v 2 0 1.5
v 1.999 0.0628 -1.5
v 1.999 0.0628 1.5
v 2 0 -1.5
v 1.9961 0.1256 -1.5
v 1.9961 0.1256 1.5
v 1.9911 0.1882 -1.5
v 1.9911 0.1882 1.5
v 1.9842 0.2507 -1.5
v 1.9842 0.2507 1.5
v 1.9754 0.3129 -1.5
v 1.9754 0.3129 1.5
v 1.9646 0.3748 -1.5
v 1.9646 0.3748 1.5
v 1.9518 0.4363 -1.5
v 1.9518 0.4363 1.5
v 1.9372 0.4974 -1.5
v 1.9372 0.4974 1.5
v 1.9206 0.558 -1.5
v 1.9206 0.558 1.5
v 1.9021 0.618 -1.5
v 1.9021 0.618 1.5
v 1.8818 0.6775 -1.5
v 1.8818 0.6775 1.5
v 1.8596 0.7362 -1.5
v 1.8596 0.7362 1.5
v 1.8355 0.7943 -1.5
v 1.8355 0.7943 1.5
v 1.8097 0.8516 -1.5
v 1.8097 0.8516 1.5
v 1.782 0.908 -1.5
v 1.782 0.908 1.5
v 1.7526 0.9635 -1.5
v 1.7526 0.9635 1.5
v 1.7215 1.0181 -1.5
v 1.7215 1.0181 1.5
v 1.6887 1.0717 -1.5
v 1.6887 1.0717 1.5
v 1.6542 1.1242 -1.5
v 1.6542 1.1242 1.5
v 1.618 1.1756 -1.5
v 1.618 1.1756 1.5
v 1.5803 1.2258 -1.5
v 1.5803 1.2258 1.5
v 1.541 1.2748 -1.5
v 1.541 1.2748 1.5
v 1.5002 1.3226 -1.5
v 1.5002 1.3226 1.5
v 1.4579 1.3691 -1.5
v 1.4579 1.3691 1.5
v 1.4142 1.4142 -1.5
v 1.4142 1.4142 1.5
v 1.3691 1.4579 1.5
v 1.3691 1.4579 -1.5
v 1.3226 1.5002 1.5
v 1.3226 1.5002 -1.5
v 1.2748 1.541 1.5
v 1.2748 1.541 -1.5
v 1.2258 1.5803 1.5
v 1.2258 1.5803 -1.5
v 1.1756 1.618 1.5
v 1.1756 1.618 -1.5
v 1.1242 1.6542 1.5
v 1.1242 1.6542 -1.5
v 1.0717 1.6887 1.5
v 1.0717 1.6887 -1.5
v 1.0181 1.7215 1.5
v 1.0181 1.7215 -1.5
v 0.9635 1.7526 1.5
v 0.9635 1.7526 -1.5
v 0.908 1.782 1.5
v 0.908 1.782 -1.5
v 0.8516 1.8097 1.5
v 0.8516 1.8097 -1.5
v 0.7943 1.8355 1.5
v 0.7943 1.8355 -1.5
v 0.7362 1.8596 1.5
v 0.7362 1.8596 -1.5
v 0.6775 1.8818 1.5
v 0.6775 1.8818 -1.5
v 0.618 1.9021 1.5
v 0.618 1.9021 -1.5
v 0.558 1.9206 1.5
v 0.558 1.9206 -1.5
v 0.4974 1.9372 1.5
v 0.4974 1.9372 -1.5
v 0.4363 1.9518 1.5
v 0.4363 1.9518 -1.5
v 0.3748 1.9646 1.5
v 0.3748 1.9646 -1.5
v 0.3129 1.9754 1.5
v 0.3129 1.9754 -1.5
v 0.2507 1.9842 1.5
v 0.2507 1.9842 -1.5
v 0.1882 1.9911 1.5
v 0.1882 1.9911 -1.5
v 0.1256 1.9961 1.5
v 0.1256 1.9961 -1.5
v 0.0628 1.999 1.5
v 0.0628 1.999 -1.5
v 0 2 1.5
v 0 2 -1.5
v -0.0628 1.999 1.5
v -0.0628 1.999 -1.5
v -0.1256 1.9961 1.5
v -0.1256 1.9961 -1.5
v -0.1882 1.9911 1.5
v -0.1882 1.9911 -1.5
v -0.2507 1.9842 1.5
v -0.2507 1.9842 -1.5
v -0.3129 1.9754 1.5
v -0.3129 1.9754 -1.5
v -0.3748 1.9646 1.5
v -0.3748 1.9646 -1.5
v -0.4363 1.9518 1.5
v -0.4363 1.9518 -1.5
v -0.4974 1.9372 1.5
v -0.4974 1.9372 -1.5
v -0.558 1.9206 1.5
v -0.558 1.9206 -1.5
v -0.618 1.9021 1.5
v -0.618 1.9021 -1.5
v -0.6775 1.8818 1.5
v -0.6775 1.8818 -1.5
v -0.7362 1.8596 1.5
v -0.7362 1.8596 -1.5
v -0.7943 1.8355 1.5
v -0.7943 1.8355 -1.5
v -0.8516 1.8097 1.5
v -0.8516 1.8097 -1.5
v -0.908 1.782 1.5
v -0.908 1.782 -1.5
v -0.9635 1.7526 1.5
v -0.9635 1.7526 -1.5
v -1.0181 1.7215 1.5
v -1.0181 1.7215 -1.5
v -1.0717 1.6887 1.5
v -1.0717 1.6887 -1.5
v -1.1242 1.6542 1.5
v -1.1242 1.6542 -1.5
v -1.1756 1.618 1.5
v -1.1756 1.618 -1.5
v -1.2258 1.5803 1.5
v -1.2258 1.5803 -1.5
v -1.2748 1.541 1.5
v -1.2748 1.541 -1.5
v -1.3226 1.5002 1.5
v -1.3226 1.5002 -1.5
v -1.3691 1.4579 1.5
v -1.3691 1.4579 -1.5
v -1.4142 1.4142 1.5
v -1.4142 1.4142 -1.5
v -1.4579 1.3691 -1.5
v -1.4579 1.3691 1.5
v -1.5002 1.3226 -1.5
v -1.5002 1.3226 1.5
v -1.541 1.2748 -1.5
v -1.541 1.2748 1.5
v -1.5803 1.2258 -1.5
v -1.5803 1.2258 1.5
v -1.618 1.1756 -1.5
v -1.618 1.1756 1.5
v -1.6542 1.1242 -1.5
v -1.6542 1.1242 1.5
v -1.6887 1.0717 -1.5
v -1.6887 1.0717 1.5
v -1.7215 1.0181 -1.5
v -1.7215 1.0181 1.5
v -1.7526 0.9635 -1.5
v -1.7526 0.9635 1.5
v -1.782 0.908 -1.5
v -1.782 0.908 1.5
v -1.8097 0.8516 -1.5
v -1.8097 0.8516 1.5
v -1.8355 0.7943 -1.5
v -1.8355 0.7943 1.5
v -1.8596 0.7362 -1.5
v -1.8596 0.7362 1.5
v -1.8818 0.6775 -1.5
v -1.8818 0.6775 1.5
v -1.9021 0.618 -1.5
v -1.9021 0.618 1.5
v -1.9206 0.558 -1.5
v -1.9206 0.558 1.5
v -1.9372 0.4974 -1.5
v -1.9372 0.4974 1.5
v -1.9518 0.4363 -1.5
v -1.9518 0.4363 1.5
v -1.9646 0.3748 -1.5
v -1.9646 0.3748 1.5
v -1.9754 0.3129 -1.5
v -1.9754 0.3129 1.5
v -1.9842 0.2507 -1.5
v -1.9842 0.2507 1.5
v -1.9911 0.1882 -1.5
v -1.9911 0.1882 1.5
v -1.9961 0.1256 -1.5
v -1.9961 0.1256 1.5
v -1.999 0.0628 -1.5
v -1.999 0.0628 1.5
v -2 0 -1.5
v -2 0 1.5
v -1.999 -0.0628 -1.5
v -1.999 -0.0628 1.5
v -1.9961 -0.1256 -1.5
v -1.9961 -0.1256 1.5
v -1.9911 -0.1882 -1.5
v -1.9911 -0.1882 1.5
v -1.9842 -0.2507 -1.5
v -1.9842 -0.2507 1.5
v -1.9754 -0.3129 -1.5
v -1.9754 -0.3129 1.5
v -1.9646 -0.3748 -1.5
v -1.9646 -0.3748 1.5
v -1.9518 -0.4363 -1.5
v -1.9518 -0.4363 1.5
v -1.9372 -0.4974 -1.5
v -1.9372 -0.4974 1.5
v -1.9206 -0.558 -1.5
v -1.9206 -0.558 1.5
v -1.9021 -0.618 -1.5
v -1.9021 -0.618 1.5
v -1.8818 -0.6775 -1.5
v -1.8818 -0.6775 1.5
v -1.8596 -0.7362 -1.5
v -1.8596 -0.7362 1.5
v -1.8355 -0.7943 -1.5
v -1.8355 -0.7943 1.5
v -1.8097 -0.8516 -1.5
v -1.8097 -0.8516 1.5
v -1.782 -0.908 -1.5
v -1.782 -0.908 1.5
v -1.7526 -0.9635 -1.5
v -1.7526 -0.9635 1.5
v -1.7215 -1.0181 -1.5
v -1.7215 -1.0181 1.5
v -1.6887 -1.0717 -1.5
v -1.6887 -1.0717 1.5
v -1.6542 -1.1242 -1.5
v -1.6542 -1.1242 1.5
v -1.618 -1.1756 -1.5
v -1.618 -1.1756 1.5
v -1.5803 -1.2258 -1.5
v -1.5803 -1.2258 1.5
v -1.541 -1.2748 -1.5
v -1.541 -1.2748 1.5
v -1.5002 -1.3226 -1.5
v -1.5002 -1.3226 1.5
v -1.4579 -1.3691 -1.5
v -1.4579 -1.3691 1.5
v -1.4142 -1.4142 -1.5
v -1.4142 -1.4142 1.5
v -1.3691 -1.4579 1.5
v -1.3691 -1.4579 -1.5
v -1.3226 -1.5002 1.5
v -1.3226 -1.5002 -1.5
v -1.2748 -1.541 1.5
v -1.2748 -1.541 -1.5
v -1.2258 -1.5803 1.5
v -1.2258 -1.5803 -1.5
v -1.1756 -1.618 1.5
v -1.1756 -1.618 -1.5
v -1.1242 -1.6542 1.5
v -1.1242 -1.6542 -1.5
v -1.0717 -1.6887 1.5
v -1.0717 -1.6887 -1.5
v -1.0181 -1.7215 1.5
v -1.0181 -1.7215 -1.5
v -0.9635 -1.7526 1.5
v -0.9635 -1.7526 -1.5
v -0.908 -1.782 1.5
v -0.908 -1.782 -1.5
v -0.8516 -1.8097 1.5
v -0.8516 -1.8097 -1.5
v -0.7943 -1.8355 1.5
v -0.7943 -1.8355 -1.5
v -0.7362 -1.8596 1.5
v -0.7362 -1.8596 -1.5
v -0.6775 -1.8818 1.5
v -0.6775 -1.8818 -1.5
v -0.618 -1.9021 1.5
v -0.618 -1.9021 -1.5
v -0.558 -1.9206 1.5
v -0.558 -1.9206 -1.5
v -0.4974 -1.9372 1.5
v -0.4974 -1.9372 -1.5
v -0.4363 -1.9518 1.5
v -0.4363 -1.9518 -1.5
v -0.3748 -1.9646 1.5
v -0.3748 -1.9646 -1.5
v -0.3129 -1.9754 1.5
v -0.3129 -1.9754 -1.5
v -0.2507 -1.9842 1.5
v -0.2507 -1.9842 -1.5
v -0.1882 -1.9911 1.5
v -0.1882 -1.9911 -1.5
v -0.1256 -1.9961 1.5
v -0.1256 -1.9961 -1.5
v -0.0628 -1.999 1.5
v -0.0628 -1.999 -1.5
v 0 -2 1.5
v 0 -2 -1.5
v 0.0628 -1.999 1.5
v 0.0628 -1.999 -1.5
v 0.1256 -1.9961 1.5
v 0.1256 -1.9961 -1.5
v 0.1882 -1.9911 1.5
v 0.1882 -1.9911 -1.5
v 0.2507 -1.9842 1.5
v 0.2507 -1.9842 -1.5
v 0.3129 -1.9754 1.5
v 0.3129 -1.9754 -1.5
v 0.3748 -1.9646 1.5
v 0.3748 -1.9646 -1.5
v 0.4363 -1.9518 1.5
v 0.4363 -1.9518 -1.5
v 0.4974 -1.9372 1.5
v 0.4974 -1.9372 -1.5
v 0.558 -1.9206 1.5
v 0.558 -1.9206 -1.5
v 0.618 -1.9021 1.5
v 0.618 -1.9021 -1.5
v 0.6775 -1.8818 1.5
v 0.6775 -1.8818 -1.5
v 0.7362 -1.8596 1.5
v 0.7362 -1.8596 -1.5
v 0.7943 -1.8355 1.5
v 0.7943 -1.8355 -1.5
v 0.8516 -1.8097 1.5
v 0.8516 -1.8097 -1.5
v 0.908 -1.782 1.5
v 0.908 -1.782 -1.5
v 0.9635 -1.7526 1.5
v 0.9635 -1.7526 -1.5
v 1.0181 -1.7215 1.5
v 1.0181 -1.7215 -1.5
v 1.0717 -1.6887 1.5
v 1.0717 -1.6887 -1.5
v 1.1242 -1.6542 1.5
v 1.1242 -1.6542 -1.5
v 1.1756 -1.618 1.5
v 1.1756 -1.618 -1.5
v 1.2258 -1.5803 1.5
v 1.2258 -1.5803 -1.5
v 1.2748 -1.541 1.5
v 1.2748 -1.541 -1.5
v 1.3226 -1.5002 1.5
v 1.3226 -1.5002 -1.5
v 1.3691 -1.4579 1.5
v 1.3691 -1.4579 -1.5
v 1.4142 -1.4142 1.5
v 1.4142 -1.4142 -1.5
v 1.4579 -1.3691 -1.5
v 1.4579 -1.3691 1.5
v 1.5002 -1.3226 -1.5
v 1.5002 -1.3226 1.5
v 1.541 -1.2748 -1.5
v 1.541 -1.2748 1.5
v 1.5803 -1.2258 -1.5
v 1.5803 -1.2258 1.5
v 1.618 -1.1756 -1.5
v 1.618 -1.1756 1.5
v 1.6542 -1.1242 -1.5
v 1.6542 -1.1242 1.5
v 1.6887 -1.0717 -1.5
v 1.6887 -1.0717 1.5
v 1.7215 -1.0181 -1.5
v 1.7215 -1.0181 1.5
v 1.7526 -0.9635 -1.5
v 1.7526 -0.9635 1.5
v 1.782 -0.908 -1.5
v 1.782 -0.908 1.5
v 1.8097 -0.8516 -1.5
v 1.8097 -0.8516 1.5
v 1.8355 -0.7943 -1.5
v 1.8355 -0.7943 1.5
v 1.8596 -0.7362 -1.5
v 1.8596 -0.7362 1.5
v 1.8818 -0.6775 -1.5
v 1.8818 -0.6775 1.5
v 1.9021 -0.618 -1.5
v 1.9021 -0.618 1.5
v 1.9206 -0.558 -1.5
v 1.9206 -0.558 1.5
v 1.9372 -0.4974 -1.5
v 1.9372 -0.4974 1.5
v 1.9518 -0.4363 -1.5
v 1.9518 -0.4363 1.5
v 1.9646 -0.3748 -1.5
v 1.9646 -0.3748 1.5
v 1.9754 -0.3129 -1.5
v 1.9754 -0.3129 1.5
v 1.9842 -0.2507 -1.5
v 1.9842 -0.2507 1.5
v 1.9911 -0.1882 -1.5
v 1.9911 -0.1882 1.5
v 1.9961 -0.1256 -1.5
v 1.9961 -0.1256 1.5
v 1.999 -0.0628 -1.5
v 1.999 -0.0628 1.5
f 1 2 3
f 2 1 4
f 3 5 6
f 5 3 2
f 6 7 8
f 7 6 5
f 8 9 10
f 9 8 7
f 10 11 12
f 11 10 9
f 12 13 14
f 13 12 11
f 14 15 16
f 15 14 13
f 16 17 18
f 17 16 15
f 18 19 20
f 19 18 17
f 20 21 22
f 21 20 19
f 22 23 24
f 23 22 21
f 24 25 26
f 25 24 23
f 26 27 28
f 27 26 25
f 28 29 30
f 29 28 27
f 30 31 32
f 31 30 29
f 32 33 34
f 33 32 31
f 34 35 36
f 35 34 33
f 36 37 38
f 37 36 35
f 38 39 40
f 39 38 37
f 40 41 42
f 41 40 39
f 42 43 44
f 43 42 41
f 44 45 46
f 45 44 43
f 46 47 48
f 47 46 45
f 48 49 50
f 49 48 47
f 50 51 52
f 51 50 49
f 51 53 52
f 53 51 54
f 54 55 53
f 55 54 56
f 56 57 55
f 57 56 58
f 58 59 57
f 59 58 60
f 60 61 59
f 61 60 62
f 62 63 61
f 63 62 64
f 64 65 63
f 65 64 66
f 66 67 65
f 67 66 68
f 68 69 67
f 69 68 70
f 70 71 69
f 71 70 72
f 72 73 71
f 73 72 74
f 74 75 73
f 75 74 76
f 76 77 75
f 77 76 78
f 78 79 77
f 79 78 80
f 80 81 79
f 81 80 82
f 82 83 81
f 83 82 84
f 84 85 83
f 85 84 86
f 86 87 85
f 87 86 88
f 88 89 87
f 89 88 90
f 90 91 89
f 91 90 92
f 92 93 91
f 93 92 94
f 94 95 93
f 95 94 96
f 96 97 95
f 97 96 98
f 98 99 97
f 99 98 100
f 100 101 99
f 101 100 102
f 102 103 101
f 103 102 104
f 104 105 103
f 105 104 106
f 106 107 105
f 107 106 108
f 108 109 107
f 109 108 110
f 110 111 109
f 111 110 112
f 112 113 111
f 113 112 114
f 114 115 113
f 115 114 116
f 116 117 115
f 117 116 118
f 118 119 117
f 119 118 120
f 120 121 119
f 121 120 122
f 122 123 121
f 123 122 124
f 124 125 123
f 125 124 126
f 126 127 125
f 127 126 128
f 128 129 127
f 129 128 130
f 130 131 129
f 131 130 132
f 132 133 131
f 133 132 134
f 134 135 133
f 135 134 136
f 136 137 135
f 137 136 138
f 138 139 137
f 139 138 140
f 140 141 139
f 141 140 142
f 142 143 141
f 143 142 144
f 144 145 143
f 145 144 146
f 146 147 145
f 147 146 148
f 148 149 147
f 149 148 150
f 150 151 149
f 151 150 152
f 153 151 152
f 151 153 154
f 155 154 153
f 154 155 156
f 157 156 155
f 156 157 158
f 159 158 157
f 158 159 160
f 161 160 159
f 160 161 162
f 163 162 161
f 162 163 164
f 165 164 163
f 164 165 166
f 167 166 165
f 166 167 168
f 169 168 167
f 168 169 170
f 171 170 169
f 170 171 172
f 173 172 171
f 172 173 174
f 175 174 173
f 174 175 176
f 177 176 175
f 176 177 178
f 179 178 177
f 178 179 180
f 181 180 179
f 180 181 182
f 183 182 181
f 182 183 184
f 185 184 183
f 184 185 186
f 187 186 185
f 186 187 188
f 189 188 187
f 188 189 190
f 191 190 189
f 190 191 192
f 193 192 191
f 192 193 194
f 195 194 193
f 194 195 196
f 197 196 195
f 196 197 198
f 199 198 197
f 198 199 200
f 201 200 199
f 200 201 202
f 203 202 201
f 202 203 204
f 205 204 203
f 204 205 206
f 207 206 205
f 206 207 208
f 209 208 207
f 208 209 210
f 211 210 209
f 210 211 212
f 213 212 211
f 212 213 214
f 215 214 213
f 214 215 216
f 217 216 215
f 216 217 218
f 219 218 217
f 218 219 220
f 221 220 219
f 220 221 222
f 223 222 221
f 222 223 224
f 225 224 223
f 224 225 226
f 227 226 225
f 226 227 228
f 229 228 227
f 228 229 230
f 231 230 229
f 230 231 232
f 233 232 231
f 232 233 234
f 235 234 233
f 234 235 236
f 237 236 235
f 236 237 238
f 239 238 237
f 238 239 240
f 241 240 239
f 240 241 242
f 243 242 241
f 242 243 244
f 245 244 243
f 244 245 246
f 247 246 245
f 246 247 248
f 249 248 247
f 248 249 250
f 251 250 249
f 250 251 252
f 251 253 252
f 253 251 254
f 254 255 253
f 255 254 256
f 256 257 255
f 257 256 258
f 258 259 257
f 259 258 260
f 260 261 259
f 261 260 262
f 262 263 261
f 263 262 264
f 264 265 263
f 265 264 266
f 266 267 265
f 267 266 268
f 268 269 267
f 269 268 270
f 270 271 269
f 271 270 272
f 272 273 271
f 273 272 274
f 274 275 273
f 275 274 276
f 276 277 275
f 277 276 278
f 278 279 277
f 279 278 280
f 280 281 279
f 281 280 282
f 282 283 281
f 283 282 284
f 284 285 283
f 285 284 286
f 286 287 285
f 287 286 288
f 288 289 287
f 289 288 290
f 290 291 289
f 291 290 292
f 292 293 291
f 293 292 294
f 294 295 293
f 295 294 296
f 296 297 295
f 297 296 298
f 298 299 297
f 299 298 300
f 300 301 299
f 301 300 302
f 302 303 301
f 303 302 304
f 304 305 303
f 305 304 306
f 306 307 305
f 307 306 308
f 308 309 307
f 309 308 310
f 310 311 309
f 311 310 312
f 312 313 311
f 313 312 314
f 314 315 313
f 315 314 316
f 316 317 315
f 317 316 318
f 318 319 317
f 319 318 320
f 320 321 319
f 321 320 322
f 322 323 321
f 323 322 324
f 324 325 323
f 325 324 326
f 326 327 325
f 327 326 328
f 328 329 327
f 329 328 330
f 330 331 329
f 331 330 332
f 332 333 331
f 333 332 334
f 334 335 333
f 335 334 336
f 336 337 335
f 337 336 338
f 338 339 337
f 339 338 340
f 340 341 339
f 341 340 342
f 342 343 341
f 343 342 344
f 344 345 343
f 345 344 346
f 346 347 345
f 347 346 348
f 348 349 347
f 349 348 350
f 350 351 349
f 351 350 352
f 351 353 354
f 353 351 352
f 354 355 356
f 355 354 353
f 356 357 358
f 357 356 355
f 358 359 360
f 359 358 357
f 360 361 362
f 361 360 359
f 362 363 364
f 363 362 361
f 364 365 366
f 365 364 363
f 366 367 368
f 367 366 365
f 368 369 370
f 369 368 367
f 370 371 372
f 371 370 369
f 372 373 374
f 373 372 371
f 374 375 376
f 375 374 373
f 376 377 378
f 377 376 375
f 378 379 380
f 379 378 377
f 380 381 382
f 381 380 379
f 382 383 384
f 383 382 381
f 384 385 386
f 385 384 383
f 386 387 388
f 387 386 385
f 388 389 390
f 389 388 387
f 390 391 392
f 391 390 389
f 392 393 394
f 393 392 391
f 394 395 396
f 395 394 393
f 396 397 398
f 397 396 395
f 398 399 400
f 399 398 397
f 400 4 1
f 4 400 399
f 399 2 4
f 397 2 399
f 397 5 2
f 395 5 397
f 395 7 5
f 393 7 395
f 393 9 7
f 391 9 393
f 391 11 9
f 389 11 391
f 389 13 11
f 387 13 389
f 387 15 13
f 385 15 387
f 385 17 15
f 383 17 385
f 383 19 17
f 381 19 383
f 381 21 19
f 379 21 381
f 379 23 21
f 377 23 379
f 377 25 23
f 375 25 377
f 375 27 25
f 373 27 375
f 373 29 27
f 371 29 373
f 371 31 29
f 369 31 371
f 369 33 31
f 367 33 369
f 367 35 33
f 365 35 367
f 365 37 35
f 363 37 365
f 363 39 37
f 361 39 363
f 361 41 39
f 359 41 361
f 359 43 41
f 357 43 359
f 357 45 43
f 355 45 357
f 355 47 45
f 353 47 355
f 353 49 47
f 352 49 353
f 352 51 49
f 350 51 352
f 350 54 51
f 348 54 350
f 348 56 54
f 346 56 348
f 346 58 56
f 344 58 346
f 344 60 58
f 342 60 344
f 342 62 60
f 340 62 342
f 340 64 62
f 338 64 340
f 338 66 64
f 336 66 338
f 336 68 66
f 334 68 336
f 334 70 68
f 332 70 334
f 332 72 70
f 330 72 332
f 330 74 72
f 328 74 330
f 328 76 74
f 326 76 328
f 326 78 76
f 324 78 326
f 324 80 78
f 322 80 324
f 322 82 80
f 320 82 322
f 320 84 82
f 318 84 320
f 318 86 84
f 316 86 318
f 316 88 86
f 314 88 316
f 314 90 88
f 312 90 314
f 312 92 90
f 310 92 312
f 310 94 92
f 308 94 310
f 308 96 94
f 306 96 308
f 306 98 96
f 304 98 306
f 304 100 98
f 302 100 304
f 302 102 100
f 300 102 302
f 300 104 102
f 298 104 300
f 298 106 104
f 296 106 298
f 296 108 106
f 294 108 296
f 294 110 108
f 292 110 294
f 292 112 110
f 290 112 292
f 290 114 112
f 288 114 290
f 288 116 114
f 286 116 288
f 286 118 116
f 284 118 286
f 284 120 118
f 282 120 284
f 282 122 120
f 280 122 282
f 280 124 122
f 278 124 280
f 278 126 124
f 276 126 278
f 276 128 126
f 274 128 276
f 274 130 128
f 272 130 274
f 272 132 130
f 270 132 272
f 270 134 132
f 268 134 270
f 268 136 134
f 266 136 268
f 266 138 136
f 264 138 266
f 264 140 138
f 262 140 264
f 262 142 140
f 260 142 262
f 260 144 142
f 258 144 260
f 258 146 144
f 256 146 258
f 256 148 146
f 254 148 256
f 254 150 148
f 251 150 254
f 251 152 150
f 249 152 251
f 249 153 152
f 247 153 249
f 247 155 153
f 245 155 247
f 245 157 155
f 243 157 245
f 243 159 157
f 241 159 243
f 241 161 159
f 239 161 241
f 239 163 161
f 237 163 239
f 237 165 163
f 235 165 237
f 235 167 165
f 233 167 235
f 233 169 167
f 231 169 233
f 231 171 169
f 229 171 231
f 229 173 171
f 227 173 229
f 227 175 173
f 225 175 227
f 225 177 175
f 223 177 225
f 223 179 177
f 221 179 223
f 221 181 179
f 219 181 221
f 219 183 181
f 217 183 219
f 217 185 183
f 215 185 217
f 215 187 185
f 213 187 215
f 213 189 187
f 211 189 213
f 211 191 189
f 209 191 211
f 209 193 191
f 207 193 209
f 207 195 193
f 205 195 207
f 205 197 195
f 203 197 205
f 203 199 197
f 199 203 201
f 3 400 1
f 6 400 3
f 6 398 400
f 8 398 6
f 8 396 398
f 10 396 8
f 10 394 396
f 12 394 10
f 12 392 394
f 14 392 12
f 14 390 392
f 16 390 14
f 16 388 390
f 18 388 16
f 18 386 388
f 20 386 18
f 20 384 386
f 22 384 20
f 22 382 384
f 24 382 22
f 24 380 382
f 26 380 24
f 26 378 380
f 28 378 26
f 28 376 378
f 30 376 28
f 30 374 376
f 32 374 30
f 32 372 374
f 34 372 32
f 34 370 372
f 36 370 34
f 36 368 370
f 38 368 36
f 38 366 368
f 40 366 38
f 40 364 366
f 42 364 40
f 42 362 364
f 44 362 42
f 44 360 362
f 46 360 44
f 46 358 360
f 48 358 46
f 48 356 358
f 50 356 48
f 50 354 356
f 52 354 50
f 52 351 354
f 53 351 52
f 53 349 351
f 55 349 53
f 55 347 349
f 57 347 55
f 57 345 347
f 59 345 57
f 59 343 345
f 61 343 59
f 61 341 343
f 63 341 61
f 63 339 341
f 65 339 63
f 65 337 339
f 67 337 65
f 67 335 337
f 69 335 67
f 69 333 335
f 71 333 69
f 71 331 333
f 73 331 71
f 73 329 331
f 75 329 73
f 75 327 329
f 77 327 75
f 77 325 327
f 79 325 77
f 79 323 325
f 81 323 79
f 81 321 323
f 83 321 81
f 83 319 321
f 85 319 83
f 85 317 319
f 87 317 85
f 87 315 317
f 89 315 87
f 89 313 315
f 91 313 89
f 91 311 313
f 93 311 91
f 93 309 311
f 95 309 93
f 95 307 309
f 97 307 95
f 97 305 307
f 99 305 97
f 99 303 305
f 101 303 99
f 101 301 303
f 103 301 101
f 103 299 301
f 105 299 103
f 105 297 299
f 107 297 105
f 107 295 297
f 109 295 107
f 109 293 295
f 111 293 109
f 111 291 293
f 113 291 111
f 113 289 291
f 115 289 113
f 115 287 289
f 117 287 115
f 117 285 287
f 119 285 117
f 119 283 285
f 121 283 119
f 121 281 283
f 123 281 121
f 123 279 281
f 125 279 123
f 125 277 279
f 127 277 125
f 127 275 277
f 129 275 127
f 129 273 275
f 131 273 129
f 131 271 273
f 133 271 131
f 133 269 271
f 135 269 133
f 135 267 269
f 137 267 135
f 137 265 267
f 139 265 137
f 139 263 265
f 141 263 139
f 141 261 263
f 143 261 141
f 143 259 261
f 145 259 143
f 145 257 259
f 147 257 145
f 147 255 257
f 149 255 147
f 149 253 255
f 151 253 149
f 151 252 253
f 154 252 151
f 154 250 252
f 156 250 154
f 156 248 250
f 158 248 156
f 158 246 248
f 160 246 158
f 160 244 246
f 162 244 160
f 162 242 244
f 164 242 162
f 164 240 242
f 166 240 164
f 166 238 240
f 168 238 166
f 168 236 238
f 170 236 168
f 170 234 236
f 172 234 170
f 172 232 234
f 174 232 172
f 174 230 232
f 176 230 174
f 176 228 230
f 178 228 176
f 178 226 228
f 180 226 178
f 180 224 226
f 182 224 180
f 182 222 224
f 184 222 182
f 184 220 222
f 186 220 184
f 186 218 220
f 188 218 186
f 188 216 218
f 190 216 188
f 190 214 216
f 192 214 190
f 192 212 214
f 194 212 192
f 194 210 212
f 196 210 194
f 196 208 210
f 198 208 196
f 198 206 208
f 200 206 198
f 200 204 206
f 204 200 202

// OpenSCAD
//Test do OpenScad
//Crtl+D = Comentar.
//Ctrl+shift+D = Descomentar.
$fn=200;//resolução do meu objeto.

//Criação de um cilíndro:
//h = altura, r1=raio inferior, r2=raio superior
//cylinder(h=3, r1=1, r2=3);
//cylinder(h=3, r=2);//Está é outra opção que no caso o r para o raio inferior será o mesmo do superior.
//cylinder(h=3, d=4);//Pode se também configurar o cilíndro pelo diâmetro.
cylinder(h=3, d=4, center = true);//O padrão do OpenScad é colocar a origem do sistema de cordenadas na base da figura, para colocar no centro da imagem o sistema de cordenadas utiliza-se esse comando do "center=true", o padrão é false.
